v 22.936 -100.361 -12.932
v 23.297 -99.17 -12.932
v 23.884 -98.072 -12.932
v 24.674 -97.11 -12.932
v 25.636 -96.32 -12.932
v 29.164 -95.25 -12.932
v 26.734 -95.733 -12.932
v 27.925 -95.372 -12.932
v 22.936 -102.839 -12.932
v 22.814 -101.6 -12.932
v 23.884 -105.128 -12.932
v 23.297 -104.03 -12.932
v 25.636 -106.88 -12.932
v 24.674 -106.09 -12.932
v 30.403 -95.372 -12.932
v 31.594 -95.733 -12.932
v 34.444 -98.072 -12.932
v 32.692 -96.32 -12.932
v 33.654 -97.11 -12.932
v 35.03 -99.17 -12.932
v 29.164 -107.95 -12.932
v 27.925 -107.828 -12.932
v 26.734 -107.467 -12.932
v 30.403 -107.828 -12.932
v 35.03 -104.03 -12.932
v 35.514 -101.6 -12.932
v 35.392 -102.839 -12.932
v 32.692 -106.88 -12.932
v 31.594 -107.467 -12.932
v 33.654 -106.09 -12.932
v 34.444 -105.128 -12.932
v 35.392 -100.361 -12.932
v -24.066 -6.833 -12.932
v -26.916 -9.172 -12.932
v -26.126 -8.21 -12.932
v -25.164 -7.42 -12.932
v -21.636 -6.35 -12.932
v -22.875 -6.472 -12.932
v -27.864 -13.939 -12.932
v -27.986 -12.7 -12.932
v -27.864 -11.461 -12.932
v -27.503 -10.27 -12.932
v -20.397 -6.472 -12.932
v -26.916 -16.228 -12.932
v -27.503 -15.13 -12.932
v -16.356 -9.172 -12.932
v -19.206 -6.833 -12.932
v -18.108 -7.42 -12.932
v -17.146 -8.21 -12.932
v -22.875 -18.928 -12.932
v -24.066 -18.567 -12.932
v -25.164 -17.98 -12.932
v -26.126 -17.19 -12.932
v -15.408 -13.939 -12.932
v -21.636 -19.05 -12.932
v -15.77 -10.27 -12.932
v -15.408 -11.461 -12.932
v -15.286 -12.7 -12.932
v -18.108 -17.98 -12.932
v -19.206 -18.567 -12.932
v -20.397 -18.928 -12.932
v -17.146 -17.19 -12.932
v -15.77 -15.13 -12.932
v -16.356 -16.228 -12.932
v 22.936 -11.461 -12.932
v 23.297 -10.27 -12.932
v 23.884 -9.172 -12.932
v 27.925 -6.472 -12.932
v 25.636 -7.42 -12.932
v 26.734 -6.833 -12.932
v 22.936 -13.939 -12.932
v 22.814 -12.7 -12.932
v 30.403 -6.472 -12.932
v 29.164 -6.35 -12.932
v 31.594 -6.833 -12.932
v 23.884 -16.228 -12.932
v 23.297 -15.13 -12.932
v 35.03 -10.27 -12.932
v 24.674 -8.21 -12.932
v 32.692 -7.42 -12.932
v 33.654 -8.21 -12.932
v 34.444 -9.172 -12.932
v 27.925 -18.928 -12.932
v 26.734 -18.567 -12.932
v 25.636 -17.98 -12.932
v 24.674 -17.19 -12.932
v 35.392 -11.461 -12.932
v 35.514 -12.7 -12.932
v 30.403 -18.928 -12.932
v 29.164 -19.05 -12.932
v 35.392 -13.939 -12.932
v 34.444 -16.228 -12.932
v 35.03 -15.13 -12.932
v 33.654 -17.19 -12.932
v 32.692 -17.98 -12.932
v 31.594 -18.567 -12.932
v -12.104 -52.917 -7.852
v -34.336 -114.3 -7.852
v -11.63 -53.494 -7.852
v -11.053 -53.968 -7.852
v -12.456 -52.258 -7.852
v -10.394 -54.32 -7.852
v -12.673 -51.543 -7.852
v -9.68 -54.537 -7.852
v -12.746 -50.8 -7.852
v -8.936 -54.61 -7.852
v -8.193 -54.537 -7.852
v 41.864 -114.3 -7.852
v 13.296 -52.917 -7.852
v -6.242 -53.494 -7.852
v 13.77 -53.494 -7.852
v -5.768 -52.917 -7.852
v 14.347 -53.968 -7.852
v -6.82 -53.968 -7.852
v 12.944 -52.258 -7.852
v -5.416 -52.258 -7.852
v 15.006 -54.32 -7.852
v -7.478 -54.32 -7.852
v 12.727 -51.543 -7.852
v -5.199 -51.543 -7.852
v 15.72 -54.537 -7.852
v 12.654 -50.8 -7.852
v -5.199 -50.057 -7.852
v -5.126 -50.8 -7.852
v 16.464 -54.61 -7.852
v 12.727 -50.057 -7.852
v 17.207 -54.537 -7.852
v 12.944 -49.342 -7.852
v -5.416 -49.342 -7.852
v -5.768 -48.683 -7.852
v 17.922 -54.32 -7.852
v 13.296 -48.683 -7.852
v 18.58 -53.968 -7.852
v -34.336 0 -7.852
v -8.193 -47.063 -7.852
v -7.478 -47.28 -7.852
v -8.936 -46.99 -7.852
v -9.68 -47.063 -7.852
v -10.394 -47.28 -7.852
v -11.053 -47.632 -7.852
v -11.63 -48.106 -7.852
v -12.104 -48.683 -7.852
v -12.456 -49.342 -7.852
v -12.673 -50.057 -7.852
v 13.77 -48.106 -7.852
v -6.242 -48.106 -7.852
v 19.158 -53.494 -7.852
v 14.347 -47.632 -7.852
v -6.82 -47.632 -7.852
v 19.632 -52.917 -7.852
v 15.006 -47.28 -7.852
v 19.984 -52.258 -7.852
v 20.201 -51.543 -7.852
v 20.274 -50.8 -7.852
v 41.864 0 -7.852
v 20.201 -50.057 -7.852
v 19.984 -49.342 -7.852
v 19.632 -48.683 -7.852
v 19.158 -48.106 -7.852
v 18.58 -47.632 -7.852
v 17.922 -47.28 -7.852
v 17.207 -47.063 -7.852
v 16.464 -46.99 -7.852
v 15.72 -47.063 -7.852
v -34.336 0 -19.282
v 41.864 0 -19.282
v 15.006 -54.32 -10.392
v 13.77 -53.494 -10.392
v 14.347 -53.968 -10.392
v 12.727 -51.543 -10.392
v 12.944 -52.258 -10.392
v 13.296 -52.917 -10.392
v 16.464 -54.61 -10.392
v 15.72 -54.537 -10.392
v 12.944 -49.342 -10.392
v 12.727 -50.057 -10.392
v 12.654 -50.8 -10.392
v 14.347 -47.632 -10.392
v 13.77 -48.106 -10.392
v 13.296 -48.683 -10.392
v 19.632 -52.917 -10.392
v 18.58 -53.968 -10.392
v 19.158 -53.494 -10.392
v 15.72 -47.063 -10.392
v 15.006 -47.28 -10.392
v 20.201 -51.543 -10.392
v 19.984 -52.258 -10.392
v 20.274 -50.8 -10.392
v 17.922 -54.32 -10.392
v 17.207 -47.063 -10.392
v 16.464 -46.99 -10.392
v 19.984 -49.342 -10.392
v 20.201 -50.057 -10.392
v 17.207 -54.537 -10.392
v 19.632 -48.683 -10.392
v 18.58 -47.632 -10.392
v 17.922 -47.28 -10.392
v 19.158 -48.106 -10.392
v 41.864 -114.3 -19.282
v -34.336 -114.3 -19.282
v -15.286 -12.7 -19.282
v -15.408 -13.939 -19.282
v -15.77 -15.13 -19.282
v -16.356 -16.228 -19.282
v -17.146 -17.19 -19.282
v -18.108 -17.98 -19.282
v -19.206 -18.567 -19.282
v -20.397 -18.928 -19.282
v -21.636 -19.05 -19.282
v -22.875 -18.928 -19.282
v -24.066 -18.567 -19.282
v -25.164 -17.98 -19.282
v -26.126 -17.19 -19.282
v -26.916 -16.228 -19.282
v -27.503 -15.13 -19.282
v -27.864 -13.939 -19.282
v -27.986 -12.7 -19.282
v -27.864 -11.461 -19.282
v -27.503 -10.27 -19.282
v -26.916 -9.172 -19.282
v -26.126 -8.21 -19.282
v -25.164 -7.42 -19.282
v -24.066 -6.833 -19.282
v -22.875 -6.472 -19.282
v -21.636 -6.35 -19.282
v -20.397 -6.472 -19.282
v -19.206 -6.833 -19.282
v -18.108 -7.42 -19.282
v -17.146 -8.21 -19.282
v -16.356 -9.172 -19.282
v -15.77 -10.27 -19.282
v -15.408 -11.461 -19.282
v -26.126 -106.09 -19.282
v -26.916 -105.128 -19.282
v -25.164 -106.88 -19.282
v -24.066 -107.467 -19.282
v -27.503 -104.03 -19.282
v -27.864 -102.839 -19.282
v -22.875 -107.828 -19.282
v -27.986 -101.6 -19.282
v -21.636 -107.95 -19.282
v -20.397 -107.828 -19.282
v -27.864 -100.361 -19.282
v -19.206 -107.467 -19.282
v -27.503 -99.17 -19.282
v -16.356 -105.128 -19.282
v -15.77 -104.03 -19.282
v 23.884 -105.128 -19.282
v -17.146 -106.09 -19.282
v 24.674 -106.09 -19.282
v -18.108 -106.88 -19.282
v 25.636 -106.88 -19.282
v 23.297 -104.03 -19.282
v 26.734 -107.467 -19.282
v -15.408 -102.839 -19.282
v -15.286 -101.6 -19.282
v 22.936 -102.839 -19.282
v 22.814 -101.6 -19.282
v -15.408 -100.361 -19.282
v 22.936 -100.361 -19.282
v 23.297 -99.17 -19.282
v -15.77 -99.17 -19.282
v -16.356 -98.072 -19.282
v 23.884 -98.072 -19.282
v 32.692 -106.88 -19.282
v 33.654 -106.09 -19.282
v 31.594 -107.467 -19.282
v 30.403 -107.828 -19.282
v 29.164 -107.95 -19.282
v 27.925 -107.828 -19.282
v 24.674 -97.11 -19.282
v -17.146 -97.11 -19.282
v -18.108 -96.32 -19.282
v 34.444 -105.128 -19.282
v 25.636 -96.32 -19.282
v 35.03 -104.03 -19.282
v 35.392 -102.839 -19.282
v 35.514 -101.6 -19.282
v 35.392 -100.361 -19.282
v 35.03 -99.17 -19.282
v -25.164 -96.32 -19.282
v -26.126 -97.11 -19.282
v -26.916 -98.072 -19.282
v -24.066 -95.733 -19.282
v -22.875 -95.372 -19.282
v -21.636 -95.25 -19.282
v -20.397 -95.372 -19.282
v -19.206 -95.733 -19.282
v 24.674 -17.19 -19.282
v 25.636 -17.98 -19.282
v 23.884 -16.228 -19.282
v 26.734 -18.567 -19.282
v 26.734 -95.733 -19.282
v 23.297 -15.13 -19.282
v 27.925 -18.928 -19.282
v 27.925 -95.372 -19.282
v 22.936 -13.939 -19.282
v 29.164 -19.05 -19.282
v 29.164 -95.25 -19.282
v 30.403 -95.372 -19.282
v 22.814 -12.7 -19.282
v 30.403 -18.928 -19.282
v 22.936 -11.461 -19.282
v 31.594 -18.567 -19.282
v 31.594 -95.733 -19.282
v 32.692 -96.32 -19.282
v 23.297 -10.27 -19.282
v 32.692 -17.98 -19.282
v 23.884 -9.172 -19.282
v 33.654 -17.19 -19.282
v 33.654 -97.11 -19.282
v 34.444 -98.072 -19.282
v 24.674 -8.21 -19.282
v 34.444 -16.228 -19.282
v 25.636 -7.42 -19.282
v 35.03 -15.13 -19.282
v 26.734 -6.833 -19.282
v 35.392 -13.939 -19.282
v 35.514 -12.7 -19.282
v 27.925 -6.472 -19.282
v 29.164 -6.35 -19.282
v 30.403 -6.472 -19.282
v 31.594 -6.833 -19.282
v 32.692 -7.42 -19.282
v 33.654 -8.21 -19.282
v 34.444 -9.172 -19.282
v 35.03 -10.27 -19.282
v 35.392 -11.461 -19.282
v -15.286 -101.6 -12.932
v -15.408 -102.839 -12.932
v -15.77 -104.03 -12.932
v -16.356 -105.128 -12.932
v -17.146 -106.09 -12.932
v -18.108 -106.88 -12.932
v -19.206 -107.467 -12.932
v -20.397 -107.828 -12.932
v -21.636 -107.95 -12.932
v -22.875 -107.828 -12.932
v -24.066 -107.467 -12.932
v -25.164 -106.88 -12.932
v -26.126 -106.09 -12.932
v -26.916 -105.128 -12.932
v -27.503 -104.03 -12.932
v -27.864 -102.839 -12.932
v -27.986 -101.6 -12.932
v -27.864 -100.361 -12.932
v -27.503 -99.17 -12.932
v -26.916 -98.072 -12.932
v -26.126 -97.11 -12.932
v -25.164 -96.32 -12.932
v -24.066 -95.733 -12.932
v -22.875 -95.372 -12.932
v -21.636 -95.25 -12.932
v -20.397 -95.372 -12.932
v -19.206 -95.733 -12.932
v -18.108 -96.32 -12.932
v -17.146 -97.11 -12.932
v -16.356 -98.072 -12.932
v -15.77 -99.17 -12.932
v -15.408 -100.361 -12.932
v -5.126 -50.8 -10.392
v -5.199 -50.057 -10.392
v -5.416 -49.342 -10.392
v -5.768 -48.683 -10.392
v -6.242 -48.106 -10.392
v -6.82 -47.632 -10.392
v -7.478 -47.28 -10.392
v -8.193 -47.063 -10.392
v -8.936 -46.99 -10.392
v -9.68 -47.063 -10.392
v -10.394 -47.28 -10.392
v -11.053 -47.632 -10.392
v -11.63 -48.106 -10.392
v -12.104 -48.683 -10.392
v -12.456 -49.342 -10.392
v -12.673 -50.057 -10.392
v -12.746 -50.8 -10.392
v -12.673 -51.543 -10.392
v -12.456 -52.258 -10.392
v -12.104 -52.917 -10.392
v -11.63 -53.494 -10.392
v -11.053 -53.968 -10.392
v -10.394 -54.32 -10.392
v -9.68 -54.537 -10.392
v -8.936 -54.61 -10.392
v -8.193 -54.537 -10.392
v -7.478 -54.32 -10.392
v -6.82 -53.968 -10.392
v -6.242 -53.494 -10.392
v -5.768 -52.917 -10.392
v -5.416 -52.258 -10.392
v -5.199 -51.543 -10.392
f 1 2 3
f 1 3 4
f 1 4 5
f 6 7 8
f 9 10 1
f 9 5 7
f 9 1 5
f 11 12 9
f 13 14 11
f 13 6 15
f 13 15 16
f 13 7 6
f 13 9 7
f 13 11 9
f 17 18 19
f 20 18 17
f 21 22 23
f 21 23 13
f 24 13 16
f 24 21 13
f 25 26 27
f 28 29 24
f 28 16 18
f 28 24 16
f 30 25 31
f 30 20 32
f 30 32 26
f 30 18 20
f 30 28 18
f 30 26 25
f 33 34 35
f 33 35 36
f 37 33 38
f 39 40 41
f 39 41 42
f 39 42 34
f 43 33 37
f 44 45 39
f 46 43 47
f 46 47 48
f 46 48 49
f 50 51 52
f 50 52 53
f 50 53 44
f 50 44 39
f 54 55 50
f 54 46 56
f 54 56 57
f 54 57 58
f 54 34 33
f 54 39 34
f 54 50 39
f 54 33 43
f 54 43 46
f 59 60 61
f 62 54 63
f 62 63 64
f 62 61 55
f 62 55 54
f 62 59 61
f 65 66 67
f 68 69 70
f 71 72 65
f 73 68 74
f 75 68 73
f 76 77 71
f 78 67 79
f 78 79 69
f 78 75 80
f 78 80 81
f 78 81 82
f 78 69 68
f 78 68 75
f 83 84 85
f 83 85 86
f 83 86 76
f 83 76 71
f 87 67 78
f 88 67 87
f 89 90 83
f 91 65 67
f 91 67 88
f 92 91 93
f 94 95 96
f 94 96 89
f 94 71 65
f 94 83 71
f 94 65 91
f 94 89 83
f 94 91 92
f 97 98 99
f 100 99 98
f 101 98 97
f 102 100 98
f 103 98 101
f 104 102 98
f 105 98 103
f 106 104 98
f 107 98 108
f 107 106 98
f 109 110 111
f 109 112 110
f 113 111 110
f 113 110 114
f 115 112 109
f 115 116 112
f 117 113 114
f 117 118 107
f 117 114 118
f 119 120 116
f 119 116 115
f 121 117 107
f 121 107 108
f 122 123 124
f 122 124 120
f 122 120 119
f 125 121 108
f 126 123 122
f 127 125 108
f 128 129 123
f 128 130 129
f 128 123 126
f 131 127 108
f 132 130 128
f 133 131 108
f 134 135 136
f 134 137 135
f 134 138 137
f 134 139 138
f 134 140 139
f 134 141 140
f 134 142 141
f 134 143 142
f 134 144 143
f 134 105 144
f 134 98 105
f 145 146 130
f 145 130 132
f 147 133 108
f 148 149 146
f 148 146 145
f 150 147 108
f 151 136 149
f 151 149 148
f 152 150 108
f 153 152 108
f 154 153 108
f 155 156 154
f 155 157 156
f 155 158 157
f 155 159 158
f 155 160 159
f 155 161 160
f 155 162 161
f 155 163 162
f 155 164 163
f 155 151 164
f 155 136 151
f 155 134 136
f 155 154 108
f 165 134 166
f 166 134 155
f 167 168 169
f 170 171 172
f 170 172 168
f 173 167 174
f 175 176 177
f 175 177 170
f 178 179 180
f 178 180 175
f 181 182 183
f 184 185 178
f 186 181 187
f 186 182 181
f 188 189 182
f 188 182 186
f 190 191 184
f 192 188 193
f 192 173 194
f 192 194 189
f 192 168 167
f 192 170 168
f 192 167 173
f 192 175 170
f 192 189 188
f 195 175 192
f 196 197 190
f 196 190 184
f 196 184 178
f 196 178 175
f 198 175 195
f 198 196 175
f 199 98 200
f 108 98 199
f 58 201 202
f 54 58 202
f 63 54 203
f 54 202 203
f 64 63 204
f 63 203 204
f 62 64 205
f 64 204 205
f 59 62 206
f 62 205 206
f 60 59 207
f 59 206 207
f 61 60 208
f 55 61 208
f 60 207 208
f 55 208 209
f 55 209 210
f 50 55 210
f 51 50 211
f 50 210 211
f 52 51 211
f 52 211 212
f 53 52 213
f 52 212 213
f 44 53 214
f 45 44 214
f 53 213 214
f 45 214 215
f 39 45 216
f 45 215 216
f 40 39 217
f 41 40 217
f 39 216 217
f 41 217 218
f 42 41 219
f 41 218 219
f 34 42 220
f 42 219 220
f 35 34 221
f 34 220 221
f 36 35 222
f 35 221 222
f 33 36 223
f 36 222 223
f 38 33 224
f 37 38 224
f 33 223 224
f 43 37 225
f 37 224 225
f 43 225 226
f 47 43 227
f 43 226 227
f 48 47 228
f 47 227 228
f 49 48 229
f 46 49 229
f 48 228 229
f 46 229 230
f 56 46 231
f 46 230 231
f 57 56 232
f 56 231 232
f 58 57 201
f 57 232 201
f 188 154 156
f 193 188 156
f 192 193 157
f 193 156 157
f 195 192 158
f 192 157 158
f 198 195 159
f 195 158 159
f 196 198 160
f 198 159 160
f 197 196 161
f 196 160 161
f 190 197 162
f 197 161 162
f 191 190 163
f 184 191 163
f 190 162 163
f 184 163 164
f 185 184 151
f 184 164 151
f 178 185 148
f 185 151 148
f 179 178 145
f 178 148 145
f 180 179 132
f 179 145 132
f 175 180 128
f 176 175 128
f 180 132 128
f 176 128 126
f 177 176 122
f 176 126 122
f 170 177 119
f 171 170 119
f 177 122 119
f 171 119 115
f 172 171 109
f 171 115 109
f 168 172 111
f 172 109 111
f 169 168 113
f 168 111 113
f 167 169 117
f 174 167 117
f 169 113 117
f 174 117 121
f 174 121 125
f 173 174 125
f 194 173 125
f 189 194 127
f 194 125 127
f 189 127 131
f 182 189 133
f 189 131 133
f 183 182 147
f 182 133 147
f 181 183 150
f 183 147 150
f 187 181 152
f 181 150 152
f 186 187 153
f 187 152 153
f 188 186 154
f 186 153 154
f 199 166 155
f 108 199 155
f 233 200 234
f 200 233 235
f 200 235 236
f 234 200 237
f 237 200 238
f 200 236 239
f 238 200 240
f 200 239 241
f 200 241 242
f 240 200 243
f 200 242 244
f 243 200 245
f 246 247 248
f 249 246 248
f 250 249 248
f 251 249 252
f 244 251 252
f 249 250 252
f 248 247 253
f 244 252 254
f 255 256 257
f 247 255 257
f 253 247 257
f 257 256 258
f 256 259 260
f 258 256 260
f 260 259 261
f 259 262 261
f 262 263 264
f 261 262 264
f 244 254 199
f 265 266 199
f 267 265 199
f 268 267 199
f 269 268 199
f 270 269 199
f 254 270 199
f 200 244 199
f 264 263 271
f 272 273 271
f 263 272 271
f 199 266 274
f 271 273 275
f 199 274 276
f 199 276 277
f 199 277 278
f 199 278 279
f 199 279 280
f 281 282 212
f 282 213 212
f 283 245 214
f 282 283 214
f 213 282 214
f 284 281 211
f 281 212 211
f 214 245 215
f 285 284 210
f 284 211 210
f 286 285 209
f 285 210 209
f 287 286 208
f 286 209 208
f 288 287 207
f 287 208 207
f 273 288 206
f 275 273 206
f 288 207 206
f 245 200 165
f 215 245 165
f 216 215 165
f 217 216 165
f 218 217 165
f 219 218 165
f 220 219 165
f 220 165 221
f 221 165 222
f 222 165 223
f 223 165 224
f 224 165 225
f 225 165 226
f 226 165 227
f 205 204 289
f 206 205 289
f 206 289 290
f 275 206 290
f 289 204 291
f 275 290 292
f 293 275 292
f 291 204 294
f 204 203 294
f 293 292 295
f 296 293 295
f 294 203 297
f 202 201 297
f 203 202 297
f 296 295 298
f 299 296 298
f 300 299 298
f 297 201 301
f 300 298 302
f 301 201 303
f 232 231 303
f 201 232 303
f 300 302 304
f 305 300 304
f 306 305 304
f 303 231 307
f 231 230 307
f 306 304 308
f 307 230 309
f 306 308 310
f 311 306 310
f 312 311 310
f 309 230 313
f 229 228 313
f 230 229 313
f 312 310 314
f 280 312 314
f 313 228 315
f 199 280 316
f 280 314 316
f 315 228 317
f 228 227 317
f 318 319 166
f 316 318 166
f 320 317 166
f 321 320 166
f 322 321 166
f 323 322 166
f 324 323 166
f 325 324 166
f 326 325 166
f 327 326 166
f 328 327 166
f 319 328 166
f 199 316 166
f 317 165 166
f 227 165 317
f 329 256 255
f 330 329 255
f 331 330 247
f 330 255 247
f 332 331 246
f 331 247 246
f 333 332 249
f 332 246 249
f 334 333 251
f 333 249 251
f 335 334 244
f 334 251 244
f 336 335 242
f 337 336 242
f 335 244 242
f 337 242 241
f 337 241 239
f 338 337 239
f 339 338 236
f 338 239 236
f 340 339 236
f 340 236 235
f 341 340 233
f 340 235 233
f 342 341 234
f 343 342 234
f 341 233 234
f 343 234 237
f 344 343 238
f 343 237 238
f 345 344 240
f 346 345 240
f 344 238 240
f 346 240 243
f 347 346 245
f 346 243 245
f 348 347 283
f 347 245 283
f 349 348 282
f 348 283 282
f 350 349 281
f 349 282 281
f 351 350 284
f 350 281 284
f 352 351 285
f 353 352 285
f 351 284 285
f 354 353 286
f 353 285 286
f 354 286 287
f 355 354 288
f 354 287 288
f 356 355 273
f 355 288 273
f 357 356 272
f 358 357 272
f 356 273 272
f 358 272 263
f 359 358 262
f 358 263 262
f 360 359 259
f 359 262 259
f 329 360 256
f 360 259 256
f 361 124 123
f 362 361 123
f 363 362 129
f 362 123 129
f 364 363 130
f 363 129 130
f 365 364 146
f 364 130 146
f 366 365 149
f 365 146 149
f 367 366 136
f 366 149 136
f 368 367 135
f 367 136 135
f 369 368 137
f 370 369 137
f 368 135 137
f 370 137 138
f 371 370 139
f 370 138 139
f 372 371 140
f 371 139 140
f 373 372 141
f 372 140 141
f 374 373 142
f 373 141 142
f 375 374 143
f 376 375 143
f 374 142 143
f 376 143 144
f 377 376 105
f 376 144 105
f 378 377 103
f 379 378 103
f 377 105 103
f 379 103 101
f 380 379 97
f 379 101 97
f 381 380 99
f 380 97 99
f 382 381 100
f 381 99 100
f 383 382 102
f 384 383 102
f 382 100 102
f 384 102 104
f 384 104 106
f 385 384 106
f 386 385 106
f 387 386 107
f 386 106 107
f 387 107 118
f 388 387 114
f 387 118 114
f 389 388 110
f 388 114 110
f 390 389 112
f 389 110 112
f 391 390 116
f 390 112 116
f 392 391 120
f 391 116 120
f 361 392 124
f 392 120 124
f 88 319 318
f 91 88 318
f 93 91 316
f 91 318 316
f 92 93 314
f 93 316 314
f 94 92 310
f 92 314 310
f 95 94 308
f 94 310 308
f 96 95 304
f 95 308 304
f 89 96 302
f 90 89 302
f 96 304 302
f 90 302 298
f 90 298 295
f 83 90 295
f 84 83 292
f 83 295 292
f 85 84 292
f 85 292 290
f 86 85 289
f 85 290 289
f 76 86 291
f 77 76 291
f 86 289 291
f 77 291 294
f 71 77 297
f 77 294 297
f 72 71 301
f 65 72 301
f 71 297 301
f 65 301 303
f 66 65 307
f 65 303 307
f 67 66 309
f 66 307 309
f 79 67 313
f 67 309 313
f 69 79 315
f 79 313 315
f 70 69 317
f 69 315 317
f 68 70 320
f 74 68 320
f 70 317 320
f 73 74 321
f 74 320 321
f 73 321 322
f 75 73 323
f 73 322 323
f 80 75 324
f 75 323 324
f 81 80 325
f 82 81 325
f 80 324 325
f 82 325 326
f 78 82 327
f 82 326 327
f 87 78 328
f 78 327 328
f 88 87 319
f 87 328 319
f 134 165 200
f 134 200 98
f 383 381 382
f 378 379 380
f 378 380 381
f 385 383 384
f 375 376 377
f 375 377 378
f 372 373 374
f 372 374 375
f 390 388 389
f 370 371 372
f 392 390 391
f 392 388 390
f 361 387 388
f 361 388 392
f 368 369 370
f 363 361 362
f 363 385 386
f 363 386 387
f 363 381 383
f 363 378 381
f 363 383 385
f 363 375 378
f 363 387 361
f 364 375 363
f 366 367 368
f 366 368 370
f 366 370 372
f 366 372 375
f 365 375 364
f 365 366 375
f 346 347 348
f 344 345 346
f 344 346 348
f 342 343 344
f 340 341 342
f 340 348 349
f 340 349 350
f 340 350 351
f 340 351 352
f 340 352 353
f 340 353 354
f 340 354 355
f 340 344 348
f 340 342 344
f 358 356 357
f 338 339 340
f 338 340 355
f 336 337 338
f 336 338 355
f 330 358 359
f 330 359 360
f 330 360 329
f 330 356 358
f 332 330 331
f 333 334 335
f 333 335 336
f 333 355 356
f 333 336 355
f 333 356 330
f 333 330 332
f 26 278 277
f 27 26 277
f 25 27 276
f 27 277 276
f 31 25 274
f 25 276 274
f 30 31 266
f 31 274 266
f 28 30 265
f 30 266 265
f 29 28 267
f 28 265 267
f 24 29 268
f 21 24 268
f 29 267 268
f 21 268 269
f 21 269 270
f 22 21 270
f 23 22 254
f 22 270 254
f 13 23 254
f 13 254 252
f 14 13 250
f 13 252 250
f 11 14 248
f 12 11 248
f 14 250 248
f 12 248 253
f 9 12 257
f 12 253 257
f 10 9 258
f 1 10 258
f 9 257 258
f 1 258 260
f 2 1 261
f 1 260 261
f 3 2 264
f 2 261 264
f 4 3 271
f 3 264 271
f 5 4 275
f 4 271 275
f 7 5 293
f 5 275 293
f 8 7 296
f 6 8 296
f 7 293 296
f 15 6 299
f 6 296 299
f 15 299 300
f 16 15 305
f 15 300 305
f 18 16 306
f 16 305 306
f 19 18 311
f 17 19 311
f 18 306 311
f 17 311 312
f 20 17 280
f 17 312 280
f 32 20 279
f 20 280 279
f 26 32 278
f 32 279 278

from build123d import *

# Parameters (mm, degrees)
F0_W     = 76.2
F0_H     = 11.43
F1_DEPTH = 114.3
F2_R     = 6.35
F3_DEPTH = 6.35
F4_R     = 3.81
F5_DEPTH = 2.54


with BuildPart() as f1:
    # F0 (on Front) → F1 (new body)
    with BuildSketch(Plane.XZ):
        with Locations((3.763746, -13.567377)):
            Rectangle(F0_W, F0_H)
    extrude(amount=F1_DEPTH)

    # F2 (on face) → F3 (cut)
    with BuildSketch(Plane(origin=(0, 0, -19.282377), x_dir=(1, 0, 0), z_dir=(0, 0, -1))):
        with Locations((-21.636254, 101.6)):
            Circle(F2_R)
        with Locations((29.163746, 101.6)):
            Circle(F2_R)
        with Locations((29.163746, 12.7)):
            Circle(F2_R)
        with Locations((-21.636254, 12.7)):
            Circle(F2_R)
    extrude(amount=-F3_DEPTH, mode=Mode.SUBTRACT)

    # F4 (on face) → F5 (cut)
    with BuildSketch(Plane.XY.offset(-7.852377)):
        with Locations((16.463746, -50.8)):
            Circle(F4_R)
        with Locations((-8.936254, -50.8)):
            Circle(F4_R)
    extrude(amount=-F5_DEPTH, mode=Mode.SUBTRACT)


solid = f1.part
